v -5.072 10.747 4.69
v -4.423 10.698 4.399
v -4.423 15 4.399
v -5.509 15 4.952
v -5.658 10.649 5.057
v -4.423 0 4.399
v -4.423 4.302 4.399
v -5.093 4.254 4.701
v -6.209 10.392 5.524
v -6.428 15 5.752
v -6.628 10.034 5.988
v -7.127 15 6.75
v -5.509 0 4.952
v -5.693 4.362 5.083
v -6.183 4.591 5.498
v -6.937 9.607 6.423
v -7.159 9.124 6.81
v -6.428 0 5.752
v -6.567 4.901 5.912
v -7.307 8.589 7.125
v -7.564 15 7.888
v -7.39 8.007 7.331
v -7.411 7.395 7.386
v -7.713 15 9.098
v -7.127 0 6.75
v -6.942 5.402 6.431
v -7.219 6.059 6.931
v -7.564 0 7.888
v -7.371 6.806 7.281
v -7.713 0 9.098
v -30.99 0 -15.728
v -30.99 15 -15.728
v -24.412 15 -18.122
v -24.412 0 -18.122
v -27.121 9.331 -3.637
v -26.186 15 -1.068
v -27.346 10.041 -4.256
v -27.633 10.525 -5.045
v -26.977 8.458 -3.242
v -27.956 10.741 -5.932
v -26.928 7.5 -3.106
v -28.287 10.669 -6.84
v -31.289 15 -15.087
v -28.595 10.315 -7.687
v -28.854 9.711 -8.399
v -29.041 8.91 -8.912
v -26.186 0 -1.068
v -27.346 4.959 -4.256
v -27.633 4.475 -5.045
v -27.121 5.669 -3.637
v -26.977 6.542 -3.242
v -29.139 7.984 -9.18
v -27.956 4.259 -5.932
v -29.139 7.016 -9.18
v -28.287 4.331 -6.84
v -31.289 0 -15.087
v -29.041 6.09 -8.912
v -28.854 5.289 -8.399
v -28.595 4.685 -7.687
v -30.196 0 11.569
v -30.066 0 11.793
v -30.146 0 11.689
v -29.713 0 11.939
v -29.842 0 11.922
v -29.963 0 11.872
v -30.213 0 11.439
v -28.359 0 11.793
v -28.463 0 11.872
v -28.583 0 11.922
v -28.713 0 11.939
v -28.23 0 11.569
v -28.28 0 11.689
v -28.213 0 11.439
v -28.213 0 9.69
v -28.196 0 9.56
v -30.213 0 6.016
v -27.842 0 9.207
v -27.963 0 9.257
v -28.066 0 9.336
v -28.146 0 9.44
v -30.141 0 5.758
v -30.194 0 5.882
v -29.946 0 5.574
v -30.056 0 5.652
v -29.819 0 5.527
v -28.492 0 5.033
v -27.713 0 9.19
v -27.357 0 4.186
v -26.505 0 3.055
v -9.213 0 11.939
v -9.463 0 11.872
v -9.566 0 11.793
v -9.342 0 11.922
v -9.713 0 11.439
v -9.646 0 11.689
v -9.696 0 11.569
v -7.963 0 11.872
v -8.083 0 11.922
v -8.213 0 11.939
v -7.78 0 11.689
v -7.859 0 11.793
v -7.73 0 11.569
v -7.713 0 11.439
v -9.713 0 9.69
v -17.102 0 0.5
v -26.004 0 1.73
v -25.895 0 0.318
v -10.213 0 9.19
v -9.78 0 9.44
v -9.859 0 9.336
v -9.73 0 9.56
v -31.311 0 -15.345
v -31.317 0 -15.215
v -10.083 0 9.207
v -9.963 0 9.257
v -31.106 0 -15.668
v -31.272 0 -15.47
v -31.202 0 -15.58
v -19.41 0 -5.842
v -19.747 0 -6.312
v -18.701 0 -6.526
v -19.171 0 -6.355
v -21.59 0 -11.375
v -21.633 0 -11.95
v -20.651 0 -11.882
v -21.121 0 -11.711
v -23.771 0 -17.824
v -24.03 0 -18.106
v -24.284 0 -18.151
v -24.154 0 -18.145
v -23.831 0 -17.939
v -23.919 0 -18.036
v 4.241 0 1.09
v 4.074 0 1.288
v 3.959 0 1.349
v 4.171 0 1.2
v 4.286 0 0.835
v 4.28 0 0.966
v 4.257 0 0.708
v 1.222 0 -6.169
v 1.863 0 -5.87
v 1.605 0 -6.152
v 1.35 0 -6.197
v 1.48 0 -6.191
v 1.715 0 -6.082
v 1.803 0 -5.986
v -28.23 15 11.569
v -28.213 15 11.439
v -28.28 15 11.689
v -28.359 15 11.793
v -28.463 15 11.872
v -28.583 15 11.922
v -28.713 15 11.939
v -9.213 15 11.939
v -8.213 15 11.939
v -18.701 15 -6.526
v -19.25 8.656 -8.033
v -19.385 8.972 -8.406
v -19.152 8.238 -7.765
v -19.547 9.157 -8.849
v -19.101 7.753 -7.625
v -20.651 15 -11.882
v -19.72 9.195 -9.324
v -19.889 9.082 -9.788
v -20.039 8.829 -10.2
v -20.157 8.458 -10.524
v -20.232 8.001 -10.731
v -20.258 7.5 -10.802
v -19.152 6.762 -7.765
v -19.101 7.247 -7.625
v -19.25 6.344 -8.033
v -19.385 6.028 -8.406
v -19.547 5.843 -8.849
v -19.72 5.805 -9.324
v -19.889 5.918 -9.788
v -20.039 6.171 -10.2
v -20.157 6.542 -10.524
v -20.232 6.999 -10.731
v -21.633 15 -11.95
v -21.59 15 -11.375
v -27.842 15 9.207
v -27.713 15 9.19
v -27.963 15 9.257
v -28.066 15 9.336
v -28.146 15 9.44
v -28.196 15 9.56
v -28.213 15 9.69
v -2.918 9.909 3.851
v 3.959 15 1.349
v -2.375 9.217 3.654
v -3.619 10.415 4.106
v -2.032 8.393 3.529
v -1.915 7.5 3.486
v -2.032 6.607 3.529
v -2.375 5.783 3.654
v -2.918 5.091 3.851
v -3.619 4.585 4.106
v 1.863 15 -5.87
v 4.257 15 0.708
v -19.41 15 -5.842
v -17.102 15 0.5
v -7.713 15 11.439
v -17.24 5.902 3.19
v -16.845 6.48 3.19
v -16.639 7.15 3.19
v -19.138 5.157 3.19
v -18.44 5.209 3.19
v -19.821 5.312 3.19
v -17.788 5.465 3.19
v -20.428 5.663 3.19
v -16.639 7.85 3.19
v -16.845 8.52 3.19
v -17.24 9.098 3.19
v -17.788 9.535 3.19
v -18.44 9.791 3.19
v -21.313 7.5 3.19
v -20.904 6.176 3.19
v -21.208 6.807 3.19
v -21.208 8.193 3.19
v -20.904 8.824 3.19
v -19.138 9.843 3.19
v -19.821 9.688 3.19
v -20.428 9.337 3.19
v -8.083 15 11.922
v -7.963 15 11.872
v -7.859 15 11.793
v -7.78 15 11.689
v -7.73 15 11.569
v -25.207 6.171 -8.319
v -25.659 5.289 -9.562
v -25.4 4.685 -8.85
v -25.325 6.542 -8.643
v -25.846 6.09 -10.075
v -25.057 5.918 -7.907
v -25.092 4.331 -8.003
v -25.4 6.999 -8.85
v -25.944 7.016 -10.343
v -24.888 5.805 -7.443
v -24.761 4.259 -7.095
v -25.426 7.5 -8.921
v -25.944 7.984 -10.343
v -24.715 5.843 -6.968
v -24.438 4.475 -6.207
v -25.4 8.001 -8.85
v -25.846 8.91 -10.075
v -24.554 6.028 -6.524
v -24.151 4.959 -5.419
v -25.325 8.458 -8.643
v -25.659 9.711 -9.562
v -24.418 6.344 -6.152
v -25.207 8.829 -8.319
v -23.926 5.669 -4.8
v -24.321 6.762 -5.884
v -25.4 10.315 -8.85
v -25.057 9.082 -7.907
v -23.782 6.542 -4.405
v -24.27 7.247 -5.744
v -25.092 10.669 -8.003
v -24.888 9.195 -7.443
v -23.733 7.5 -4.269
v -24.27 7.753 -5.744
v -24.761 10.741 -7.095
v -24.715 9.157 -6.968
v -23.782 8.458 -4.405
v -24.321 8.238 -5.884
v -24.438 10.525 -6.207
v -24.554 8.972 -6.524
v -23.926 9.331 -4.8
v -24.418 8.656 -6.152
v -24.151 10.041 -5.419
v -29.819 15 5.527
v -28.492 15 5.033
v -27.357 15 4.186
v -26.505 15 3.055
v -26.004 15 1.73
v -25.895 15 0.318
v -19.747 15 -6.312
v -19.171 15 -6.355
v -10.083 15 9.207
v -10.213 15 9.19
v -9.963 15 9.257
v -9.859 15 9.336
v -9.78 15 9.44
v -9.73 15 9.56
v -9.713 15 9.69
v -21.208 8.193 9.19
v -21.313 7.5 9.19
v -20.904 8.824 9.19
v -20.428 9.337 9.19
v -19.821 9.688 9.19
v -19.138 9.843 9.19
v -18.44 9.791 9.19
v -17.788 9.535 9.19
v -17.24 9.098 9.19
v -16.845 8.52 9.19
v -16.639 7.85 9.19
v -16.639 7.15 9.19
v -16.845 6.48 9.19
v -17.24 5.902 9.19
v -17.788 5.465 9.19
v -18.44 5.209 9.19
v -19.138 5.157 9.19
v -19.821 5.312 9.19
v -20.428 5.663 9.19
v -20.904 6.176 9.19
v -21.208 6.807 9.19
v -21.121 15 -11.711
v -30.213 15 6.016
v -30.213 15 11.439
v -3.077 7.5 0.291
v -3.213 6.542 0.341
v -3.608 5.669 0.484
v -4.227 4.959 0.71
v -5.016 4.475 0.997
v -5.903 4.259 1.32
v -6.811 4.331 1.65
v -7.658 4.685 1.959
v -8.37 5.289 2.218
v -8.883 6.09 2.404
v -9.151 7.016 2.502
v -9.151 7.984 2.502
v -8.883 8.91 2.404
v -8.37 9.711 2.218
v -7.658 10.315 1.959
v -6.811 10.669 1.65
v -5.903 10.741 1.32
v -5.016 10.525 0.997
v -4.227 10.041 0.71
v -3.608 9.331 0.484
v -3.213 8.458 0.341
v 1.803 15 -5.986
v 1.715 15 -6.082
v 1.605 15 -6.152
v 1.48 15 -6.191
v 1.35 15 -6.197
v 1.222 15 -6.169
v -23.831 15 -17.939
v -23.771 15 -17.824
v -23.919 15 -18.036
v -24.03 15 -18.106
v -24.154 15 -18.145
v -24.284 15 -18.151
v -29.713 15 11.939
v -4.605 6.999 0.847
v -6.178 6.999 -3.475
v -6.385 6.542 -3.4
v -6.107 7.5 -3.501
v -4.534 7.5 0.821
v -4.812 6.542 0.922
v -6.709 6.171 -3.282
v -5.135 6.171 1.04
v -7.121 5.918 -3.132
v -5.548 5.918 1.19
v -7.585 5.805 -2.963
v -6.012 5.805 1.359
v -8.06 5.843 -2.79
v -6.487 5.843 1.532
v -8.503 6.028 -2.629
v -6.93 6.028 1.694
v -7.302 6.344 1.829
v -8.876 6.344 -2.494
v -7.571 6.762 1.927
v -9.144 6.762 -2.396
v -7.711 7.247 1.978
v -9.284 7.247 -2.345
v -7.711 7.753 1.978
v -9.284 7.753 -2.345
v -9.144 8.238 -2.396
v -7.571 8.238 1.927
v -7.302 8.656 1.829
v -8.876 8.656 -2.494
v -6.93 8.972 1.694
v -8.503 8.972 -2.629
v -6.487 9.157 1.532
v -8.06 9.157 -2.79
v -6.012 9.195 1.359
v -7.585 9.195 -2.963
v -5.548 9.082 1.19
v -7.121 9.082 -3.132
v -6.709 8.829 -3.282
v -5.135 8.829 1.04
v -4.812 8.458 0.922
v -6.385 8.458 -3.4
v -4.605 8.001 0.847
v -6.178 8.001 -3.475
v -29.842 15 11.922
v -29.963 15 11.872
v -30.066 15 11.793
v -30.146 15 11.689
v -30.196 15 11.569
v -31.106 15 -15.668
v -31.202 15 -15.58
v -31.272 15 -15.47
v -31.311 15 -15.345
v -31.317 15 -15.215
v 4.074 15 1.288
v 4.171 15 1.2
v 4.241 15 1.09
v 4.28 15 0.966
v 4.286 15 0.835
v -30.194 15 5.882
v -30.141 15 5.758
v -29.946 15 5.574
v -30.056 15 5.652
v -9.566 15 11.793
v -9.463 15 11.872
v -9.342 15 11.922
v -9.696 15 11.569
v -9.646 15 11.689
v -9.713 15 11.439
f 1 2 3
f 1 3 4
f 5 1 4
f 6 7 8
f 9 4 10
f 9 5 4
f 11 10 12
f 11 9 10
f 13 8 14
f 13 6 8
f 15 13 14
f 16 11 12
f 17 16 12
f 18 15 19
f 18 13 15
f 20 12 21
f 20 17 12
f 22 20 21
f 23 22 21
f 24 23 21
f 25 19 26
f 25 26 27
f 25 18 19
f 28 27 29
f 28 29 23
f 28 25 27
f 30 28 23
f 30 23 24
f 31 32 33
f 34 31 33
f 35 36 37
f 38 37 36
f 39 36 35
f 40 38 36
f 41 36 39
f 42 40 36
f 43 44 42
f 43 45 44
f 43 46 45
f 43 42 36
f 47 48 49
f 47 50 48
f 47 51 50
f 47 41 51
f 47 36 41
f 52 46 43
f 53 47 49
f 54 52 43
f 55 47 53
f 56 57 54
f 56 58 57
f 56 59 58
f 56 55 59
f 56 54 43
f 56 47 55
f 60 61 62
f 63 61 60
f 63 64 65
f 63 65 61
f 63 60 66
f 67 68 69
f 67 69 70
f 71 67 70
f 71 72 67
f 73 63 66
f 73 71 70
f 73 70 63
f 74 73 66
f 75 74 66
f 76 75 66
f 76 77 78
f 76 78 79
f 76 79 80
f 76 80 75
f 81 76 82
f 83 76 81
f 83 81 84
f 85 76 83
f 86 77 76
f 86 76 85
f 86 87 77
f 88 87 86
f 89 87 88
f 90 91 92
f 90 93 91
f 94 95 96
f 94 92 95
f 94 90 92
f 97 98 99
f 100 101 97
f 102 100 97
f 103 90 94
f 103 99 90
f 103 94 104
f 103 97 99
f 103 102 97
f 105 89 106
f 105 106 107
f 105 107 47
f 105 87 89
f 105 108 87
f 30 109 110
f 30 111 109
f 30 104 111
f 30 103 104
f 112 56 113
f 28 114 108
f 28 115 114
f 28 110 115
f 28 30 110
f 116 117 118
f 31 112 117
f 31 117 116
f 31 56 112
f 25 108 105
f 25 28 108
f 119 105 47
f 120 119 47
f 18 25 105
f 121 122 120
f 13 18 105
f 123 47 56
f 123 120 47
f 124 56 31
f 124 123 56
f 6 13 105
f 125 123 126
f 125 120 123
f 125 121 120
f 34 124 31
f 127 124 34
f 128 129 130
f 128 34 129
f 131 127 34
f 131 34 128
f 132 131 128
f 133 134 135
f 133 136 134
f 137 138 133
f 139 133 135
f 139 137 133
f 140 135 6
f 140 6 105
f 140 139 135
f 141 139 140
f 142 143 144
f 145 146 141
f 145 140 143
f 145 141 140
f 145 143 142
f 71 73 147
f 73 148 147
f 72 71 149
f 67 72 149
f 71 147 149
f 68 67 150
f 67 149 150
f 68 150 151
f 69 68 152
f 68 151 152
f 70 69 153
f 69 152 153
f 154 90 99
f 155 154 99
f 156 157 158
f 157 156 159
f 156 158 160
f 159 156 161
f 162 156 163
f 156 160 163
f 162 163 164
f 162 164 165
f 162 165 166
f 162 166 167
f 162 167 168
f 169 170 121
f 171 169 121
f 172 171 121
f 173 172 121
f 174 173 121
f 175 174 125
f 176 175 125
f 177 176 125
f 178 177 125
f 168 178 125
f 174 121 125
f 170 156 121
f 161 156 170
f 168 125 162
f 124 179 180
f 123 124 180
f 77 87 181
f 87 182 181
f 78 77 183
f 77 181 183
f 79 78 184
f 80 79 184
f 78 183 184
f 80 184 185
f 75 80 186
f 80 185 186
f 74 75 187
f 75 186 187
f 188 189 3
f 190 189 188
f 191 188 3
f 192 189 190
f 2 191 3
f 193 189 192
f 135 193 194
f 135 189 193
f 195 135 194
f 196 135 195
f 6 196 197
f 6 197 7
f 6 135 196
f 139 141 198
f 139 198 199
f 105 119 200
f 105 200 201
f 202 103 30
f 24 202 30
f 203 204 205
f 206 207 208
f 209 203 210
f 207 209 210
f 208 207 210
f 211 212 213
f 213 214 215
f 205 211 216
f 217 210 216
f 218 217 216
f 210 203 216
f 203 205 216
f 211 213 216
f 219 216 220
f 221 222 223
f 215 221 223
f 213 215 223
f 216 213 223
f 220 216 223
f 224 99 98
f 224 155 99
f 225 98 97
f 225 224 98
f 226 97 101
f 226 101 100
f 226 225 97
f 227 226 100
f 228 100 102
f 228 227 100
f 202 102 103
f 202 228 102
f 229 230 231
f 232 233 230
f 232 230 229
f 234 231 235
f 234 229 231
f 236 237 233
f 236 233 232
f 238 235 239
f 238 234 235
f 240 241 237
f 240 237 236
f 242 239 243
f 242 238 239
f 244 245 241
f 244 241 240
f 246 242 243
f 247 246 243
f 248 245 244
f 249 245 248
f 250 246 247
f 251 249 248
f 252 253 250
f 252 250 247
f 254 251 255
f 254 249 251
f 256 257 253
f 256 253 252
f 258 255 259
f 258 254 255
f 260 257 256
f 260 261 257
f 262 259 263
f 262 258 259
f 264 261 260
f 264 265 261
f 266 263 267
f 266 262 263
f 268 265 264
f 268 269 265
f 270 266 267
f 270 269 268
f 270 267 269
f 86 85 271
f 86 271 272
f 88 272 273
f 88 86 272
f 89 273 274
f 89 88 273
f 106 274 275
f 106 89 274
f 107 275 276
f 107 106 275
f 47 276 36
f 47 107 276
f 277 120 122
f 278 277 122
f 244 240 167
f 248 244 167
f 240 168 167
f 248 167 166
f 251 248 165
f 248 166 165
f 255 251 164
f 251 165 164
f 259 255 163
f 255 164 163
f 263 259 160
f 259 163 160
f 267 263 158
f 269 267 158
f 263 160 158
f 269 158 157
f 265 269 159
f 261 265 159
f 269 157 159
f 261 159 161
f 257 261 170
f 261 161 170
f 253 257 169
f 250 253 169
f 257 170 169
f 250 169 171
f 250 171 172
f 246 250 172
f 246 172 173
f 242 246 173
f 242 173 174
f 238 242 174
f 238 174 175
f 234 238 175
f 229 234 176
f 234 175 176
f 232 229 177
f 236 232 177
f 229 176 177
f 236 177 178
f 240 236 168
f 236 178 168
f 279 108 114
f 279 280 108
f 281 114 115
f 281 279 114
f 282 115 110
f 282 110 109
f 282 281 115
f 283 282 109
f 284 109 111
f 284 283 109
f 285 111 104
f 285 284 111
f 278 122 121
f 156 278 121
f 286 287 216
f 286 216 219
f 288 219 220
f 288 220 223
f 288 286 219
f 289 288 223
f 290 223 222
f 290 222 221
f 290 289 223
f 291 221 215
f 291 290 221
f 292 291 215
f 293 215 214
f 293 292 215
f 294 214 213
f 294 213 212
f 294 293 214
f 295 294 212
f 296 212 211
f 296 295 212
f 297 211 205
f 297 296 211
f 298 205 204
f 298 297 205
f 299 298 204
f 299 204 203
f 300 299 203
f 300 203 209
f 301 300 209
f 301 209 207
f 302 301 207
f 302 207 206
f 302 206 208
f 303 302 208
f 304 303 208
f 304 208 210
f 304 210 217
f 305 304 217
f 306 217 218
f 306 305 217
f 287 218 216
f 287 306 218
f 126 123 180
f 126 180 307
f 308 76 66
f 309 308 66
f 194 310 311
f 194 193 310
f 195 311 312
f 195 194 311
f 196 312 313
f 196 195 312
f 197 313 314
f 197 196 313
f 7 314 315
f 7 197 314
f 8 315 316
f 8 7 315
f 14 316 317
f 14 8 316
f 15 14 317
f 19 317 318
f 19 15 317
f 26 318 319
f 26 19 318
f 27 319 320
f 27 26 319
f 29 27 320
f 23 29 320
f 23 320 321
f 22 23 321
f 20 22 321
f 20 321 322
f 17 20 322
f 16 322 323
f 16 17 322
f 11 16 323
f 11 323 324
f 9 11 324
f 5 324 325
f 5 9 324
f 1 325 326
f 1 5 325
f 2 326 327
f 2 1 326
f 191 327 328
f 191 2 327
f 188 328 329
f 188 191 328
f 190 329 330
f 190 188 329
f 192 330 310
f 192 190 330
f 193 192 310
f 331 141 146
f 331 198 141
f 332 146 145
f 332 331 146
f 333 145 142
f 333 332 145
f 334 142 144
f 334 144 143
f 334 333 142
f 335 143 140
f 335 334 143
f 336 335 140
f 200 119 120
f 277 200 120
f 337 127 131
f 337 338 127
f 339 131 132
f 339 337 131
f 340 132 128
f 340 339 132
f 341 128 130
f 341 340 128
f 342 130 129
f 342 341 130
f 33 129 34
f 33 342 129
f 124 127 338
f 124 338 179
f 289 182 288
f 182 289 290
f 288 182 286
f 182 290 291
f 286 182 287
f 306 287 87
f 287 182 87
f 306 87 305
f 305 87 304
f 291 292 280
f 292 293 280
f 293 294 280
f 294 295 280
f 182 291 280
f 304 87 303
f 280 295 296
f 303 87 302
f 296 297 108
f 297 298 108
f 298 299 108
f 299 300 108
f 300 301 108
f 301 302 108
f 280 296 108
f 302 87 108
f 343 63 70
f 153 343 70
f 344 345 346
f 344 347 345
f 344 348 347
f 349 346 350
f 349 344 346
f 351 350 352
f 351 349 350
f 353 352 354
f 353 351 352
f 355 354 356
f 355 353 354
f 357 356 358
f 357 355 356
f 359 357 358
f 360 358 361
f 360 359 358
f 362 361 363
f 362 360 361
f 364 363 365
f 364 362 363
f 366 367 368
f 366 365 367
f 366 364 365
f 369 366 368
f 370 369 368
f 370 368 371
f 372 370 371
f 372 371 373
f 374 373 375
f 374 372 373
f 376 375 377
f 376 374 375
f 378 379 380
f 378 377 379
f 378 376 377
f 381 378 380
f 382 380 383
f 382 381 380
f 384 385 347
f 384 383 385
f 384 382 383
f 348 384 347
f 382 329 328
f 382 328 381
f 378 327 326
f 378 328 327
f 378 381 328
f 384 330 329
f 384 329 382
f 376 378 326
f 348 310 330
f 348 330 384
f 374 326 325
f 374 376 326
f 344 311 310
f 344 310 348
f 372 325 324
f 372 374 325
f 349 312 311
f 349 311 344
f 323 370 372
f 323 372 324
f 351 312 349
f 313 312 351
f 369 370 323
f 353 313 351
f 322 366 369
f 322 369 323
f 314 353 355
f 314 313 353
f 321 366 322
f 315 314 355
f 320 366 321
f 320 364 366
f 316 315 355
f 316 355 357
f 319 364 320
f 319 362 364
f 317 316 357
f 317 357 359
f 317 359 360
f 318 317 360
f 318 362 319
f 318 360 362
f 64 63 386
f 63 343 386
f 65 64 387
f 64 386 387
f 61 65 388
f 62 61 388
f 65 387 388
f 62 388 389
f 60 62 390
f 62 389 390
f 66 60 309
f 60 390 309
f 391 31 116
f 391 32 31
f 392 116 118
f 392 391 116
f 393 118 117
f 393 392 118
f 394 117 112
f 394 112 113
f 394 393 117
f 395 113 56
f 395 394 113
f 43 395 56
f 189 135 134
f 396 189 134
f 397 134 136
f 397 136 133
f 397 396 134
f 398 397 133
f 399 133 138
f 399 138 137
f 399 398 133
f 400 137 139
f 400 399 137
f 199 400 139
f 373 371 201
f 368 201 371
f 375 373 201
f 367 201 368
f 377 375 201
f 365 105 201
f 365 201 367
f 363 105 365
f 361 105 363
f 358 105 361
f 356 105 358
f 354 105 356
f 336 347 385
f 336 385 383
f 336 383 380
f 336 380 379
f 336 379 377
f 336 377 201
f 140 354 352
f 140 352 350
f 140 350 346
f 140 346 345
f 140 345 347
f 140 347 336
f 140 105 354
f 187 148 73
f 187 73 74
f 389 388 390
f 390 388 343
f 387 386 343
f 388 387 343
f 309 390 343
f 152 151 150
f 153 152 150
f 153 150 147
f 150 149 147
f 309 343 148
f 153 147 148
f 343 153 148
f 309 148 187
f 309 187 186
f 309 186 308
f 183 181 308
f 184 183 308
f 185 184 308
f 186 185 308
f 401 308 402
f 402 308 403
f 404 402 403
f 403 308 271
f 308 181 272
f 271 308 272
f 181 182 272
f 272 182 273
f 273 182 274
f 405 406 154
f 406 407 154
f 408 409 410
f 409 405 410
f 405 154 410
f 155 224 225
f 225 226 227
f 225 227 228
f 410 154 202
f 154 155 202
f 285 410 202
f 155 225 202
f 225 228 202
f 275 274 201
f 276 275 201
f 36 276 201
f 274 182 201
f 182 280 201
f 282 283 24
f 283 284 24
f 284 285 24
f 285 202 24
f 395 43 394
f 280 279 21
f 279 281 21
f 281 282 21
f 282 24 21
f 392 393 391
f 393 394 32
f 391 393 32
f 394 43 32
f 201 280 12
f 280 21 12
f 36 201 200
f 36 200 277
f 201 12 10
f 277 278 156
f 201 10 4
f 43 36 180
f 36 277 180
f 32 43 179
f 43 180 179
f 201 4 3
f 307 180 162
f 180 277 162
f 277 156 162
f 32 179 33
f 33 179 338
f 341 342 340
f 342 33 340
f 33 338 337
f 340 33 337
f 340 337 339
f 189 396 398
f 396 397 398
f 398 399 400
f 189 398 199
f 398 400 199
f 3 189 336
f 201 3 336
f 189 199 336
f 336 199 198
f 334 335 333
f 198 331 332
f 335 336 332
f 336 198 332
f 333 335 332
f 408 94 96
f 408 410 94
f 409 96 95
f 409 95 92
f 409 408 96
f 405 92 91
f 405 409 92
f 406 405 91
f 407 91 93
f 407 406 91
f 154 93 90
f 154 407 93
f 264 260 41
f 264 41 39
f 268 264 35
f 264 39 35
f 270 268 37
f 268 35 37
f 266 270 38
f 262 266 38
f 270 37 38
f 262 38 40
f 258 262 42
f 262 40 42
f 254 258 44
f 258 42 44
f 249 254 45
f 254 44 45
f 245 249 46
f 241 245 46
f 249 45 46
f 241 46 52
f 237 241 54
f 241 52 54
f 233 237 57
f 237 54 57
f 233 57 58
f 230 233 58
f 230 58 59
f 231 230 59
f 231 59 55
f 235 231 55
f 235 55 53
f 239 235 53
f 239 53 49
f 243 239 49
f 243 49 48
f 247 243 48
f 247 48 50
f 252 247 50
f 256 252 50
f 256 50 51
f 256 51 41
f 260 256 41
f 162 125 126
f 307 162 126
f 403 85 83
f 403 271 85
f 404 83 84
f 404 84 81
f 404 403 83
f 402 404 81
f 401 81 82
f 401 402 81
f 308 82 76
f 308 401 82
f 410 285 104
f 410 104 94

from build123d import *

# Parameters (mm, degrees)
BOSS_EXTRUDE1_DEPTH                                 = 15
SKETCH4_R                                           = 2.35
CUT_EXTRUDE3_DEPTH                                  = 6
CBORE_FOR_M3_HEX_SOCKET_HEAD_CAP_SCREW1_D           = 3.4
CBORE_FOR_M3_HEX_SOCKET_HEAD_CAP_SCREW1_CBORE_D     = 6.5
CBORE_FOR_M3_HEX_SOCKET_HEAD_CAP_SCREW1_CBORE_DEPTH = 3.4
CUT_EXTRUDE4_DEPTH                                  = 40.36183231
SKETCH2_R                                           = 3.25
CUT_EXTRUDE5_DEPTH                                  = 42.264373258
FILLET4_R                                           = 5
FILLET5_R                                           = 5
FILLET6_R                                           = 0.5
FILLET7_R                                           = 0.5
FILLET8_R                                           = 0.5
FILLET9_R                                           = 0.5
FILLET10_R                                          = 0.5
FILLET11_R                                          = 0.5
FILLET12_R                                          = 0.5
FILLET13_R                                          = 0.5
FILLET14_R                                          = 0.5
FILLET15_R                                          = 0.5
FILLET16_R                                          = 0.5


with BuildPart() as part:
    # Sketch1 → Boss-Extrude1 (new body)
    with BuildSketch(Plane(origin=(0, 0, 0), x_dir=(1, 0, 0), z_dir=(0, 1, 0))):
        Polygon((-23.760232958, -5.596615827), (-31.459597373, 15.557214047), (-23.942056406, 18.293375193), (-17.10165354, -0.500477222), (1.692198876, 6.339925644), (4.428360022, -1.177615322), (-7.712744083, -5.596615827), align=None)
        Polygon((-20.650889023, 11.882391084), (-21.496612382, 11.574572955), (-19.547097565, 6.218325016), (-18.701374206, 6.526143145), align=None)
        Polygon((-18.962744083, -5.596615827), (-23.760232958, -5.596615827), (-30.212744083, -5.596615827), (-30.212744083, -11.939309749), (-28.212744083, -11.939309749), (-28.212744083, -9.189582126), (-9.712744083, -9.189582126), (-9.712744083, -11.939309749), (-7.712744083, -11.939309749), (-7.712744083, -5.596615827), align=None)
    extrude(amount=BOSS_EXTRUDE1_DEPTH)

    # Sketch4 → Cut-Extrude3 (cut)
    with BuildSketch(Plane(origin=(0, 0, 9.189582126), x_dir=(-1, 0, 0), z_dir=(0, 0, -1))):
        with Locations((18.962744083, 7.5)):
            Circle(SKETCH4_R)
    extrude(amount=CUT_EXTRUDE3_DEPTH, mode=Mode.SUBTRACT)

    # CBORE for M3 Hex Socket Head Cap Screw1 (through all)
    with Locations(Plane(origin=(-22.779531346, 0, 8.291071361), x_dir=(0.34202014332566366, 0, 0.9396926207859102), z_dir=(-0.9396926207859103, 0, 0.3420201433256637))):
        with Locations((-15.378815242, 7.5)):
            CounterBoreHole(CBORE_FOR_M3_HEX_SOCKET_HEAD_CAP_SCREW1_D / 2, CBORE_FOR_M3_HEX_SOCKET_HEAD_CAP_SCREW1_CBORE_D / 2, CBORE_FOR_M3_HEX_SOCKET_HEAD_CAP_SCREW1_CBORE_DEPTH)

    # Sketch10 → CBORE for M3 Hex Socket Head Cap Screw2 (revolve, cut)
    with BuildSketch(Plane(origin=(-4.968566186, 7.5, 4.597816755), x_dir=(0.9396926207859094, 0, -0.34202014332566627), z_dir=(0, 1, 0))):
        Polygon((0, 0), (0, 30.571150439), (1.7, 30.571150439), (1.7, 3.4), (3.25, 3.4), (3.25, 0), align=None)
    revolve(axis=Axis((-2.796738275, 7.5, 10.564864897), (-0.34202014332566627, 0, -0.9396926207859094)), mode=Mode.SUBTRACT)

    # Sketch11 → Cut-Extrude4 (cut, through all)
    with BuildSketch(Plane(origin=(0, 15, 0), x_dir=(1, 0, 0), z_dir=(0, 1, 0))):
        Polygon((-21.633420439, 11.950450003), (-21.589873913, 11.374572955), (-21.120735333, 11.711381012), (-21.496612382, 11.574572955), align=None)
    cut_extrude4 = extrude(amount=-CUT_EXTRUDE4_DEPTH, mode=Mode.SUBTRACT)

    # Mirror1: Cut-Extrude4 across plane
    add(cut_extrude4.mirror(Plane(origin=(-5.259864593, 0, -14.4513592), x_dir=(0.9396926207859102, 0, -0.3420201433256638), z_dir=(-0.3420201433256638, 0, -0.9396926207859102))), mode=Mode.SUBTRACT)

    # Sketch2 → Cut-Extrude5 (cut, through all)
    with BuildSketch(Plane(origin=(0.896497987, 0, 2.463107975), x_dir=(0.9396926207859094, 0, -0.34202014332566627), z_dir=(0.34202014332566627, 0, 0.9396926207859094))):
        with Locations((-6.241470926, 7.5)):
            Circle(SKETCH2_R)
    extrude(amount=CUT_EXTRUDE5_DEPTH, mode=Mode.SUBTRACT)

    # Fillet4
    # the kernel refuses this fillet: 5 mm, written as the material it adds along each edge
    with BuildSketch(Plane(origin=(-23.760232958, 0, 5.596615827), x_dir=(-0.34202014332566355, 0, -0.9396926207859103), z_dir=(0, 1, 0))) as fillet4_piece_1:
        with BuildLine():
            CenterArc((7.092503292, 5), FILLET4_R, 167.720815182, 102.279184818)
            Line((2.20688878, 6.06337709), (2.10917649, 6.084644632))
            ThreePointArc((2.10917649, 6.084644632), (1.009475128, 3.065890559), (-0.093969262, 0.034202014))
            Line((-0.093969262, 0.034202014), (0, -0.1))
            Line((0, -0.1), (7.092503292, -0.1))
            Line((7.092503292, -0.1), (7.092503292, 0))
        make_face()
    extrude(amount=15)

    # Fillet5
    # the kernel refuses this fillet: 5 mm, written as the material it adds along each edge
    with BuildSketch(Plane(origin=(-7.712744083, 0.173725541, 5.596615827), x_dir=(0, 0, 1), z_dir=(0, 1, 0))) as fillet5_piece_1_section:
        with BuildLine():
            CenterArc((FILLET5_R * 0.70020753821, FILLET5_R), FILLET5_R, 200, 70)
            Line((-FILLET5_R * 0.239485082576, FILLET5_R * 0.657979856674), (0, 0))
            Line((0, 0), (FILLET5_R * 0.70020753821, 0))
        make_face()
    fillet5_piece_1 = extrude(amount=14.826274459, mode=Mode.PRIVATE)
    fillet5_piece_1 = fillet5_piece_1 - Plane(origin=(-4.162007445, 7.5, 6.813818681), x_dir=(0.9396926207859094, 0, -0.34202014332566627), z_dir=(-0.34202014332566627, 0, -0.9396926207859094)) * Cylinder(3.25, 44, mode=Mode.PRIVATE)
    add(fillet5_piece_1)
    with BuildSketch(Plane(origin=(-7.712744083, 0, 5.596615827), x_dir=(0, 0, 1), z_dir=(0, 1, 0))) as fillet5_piece_2_section:
        with BuildLine():
            CenterArc((FILLET5_R * 0.70020753821, FILLET5_R), FILLET5_R, 200, 70)
            Line((-FILLET5_R * 0.239485082576, FILLET5_R * 0.657979856674), (0, 0))
            Line((0, 0), (FILLET5_R * 0.70020753821, 0))
        make_face()
    fillet5_piece_2 = extrude(amount=14.826274459, mode=Mode.PRIVATE)
    fillet5_piece_2 = fillet5_piece_2 - Plane(origin=(-4.162007445, 7.5, 6.813818681), x_dir=(0.9396926207859094, 0, -0.34202014332566627), z_dir=(-0.34202014332566627, 0, -0.9396926207859094)) * Cylinder(3.25, 44, mode=Mode.PRIVATE)
    add(fillet5_piece_2)

    # Fillet6
    fillet6_edges = [part.edges().sort_by_distance(p)[0] for p in [
        (-28.212744083, 7.5, 9.189582126),
    ]]
    fillet(fillet6_edges, radius=FILLET6_R)

    # Fillet7
    fillet7_edges = [part.edges().sort_by_distance(p)[0] for p in [
        (-9.712744083, 7.5, 9.189582126),
    ]]
    fillet(fillet7_edges, radius=FILLET7_R)

    # Fillet8
    fillet8_edges = [part.edges().sort_by_distance(p)[0] for p in [
        (-28.212744083, 7.5, 11.939309749),
    ]]
    fillet(fillet8_edges, radius=FILLET8_R)

    # Fillet9
    fillet9_edges = [part.edges().sort_by_distance(p)[0] for p in [
        (-9.712744083, 7.5, 11.939309749),
    ]]
    fillet(fillet9_edges, radius=FILLET9_R)

    # Fillet10
    fillet10_edges = [part.edges().sort_by_distance(p)[0] for p in [
        (-30.212744083, 7.5, 11.939309749),
    ]]
    fillet(fillet10_edges, radius=FILLET10_R)

    # Fillet11
    fillet11_edges = [part.edges().sort_by_distance(p)[0] for p in [
        (-7.712744083, 7.5, 11.939309749),
    ]]
    fillet(fillet11_edges, radius=FILLET11_R)

    # Fillet12
    fillet12_edges = [part.edges().sort_by_distance(p)[0] for p in [
        (4.428360022, 7.5, 1.177615322),
    ]]
    fillet(fillet12_edges, radius=FILLET12_R)

    # Fillet13
    fillet13_edges = [part.edges().sort_by_distance(p)[0] for p in [
        (1.692198876, 7.5, -6.339925644),
    ]]
    fillet(fillet13_edges, radius=FILLET13_R)

    # Fillet14
    fillet14_edges = [part.edges().sort_by_distance(p)[0] for p in [
        (-23.942056406, 7.5, -18.293375193),
    ]]
    fillet(fillet14_edges, radius=FILLET14_R)

    # Fillet15
    fillet15_edges = [part.edges().sort_by_distance(p)[0] for p in [
        (-31.459597373, 7.5, -15.557214047),
    ]]
    fillet(fillet15_edges, radius=FILLET15_R)

    # Fillet16
    fillet16_edges = [part.edges().sort_by_distance(p)[0] for p in [
        (-30.212744083, 7.5, 5.596615827),
    ]]
    fillet(fillet16_edges, radius=FILLET16_R)


solid = part.part
